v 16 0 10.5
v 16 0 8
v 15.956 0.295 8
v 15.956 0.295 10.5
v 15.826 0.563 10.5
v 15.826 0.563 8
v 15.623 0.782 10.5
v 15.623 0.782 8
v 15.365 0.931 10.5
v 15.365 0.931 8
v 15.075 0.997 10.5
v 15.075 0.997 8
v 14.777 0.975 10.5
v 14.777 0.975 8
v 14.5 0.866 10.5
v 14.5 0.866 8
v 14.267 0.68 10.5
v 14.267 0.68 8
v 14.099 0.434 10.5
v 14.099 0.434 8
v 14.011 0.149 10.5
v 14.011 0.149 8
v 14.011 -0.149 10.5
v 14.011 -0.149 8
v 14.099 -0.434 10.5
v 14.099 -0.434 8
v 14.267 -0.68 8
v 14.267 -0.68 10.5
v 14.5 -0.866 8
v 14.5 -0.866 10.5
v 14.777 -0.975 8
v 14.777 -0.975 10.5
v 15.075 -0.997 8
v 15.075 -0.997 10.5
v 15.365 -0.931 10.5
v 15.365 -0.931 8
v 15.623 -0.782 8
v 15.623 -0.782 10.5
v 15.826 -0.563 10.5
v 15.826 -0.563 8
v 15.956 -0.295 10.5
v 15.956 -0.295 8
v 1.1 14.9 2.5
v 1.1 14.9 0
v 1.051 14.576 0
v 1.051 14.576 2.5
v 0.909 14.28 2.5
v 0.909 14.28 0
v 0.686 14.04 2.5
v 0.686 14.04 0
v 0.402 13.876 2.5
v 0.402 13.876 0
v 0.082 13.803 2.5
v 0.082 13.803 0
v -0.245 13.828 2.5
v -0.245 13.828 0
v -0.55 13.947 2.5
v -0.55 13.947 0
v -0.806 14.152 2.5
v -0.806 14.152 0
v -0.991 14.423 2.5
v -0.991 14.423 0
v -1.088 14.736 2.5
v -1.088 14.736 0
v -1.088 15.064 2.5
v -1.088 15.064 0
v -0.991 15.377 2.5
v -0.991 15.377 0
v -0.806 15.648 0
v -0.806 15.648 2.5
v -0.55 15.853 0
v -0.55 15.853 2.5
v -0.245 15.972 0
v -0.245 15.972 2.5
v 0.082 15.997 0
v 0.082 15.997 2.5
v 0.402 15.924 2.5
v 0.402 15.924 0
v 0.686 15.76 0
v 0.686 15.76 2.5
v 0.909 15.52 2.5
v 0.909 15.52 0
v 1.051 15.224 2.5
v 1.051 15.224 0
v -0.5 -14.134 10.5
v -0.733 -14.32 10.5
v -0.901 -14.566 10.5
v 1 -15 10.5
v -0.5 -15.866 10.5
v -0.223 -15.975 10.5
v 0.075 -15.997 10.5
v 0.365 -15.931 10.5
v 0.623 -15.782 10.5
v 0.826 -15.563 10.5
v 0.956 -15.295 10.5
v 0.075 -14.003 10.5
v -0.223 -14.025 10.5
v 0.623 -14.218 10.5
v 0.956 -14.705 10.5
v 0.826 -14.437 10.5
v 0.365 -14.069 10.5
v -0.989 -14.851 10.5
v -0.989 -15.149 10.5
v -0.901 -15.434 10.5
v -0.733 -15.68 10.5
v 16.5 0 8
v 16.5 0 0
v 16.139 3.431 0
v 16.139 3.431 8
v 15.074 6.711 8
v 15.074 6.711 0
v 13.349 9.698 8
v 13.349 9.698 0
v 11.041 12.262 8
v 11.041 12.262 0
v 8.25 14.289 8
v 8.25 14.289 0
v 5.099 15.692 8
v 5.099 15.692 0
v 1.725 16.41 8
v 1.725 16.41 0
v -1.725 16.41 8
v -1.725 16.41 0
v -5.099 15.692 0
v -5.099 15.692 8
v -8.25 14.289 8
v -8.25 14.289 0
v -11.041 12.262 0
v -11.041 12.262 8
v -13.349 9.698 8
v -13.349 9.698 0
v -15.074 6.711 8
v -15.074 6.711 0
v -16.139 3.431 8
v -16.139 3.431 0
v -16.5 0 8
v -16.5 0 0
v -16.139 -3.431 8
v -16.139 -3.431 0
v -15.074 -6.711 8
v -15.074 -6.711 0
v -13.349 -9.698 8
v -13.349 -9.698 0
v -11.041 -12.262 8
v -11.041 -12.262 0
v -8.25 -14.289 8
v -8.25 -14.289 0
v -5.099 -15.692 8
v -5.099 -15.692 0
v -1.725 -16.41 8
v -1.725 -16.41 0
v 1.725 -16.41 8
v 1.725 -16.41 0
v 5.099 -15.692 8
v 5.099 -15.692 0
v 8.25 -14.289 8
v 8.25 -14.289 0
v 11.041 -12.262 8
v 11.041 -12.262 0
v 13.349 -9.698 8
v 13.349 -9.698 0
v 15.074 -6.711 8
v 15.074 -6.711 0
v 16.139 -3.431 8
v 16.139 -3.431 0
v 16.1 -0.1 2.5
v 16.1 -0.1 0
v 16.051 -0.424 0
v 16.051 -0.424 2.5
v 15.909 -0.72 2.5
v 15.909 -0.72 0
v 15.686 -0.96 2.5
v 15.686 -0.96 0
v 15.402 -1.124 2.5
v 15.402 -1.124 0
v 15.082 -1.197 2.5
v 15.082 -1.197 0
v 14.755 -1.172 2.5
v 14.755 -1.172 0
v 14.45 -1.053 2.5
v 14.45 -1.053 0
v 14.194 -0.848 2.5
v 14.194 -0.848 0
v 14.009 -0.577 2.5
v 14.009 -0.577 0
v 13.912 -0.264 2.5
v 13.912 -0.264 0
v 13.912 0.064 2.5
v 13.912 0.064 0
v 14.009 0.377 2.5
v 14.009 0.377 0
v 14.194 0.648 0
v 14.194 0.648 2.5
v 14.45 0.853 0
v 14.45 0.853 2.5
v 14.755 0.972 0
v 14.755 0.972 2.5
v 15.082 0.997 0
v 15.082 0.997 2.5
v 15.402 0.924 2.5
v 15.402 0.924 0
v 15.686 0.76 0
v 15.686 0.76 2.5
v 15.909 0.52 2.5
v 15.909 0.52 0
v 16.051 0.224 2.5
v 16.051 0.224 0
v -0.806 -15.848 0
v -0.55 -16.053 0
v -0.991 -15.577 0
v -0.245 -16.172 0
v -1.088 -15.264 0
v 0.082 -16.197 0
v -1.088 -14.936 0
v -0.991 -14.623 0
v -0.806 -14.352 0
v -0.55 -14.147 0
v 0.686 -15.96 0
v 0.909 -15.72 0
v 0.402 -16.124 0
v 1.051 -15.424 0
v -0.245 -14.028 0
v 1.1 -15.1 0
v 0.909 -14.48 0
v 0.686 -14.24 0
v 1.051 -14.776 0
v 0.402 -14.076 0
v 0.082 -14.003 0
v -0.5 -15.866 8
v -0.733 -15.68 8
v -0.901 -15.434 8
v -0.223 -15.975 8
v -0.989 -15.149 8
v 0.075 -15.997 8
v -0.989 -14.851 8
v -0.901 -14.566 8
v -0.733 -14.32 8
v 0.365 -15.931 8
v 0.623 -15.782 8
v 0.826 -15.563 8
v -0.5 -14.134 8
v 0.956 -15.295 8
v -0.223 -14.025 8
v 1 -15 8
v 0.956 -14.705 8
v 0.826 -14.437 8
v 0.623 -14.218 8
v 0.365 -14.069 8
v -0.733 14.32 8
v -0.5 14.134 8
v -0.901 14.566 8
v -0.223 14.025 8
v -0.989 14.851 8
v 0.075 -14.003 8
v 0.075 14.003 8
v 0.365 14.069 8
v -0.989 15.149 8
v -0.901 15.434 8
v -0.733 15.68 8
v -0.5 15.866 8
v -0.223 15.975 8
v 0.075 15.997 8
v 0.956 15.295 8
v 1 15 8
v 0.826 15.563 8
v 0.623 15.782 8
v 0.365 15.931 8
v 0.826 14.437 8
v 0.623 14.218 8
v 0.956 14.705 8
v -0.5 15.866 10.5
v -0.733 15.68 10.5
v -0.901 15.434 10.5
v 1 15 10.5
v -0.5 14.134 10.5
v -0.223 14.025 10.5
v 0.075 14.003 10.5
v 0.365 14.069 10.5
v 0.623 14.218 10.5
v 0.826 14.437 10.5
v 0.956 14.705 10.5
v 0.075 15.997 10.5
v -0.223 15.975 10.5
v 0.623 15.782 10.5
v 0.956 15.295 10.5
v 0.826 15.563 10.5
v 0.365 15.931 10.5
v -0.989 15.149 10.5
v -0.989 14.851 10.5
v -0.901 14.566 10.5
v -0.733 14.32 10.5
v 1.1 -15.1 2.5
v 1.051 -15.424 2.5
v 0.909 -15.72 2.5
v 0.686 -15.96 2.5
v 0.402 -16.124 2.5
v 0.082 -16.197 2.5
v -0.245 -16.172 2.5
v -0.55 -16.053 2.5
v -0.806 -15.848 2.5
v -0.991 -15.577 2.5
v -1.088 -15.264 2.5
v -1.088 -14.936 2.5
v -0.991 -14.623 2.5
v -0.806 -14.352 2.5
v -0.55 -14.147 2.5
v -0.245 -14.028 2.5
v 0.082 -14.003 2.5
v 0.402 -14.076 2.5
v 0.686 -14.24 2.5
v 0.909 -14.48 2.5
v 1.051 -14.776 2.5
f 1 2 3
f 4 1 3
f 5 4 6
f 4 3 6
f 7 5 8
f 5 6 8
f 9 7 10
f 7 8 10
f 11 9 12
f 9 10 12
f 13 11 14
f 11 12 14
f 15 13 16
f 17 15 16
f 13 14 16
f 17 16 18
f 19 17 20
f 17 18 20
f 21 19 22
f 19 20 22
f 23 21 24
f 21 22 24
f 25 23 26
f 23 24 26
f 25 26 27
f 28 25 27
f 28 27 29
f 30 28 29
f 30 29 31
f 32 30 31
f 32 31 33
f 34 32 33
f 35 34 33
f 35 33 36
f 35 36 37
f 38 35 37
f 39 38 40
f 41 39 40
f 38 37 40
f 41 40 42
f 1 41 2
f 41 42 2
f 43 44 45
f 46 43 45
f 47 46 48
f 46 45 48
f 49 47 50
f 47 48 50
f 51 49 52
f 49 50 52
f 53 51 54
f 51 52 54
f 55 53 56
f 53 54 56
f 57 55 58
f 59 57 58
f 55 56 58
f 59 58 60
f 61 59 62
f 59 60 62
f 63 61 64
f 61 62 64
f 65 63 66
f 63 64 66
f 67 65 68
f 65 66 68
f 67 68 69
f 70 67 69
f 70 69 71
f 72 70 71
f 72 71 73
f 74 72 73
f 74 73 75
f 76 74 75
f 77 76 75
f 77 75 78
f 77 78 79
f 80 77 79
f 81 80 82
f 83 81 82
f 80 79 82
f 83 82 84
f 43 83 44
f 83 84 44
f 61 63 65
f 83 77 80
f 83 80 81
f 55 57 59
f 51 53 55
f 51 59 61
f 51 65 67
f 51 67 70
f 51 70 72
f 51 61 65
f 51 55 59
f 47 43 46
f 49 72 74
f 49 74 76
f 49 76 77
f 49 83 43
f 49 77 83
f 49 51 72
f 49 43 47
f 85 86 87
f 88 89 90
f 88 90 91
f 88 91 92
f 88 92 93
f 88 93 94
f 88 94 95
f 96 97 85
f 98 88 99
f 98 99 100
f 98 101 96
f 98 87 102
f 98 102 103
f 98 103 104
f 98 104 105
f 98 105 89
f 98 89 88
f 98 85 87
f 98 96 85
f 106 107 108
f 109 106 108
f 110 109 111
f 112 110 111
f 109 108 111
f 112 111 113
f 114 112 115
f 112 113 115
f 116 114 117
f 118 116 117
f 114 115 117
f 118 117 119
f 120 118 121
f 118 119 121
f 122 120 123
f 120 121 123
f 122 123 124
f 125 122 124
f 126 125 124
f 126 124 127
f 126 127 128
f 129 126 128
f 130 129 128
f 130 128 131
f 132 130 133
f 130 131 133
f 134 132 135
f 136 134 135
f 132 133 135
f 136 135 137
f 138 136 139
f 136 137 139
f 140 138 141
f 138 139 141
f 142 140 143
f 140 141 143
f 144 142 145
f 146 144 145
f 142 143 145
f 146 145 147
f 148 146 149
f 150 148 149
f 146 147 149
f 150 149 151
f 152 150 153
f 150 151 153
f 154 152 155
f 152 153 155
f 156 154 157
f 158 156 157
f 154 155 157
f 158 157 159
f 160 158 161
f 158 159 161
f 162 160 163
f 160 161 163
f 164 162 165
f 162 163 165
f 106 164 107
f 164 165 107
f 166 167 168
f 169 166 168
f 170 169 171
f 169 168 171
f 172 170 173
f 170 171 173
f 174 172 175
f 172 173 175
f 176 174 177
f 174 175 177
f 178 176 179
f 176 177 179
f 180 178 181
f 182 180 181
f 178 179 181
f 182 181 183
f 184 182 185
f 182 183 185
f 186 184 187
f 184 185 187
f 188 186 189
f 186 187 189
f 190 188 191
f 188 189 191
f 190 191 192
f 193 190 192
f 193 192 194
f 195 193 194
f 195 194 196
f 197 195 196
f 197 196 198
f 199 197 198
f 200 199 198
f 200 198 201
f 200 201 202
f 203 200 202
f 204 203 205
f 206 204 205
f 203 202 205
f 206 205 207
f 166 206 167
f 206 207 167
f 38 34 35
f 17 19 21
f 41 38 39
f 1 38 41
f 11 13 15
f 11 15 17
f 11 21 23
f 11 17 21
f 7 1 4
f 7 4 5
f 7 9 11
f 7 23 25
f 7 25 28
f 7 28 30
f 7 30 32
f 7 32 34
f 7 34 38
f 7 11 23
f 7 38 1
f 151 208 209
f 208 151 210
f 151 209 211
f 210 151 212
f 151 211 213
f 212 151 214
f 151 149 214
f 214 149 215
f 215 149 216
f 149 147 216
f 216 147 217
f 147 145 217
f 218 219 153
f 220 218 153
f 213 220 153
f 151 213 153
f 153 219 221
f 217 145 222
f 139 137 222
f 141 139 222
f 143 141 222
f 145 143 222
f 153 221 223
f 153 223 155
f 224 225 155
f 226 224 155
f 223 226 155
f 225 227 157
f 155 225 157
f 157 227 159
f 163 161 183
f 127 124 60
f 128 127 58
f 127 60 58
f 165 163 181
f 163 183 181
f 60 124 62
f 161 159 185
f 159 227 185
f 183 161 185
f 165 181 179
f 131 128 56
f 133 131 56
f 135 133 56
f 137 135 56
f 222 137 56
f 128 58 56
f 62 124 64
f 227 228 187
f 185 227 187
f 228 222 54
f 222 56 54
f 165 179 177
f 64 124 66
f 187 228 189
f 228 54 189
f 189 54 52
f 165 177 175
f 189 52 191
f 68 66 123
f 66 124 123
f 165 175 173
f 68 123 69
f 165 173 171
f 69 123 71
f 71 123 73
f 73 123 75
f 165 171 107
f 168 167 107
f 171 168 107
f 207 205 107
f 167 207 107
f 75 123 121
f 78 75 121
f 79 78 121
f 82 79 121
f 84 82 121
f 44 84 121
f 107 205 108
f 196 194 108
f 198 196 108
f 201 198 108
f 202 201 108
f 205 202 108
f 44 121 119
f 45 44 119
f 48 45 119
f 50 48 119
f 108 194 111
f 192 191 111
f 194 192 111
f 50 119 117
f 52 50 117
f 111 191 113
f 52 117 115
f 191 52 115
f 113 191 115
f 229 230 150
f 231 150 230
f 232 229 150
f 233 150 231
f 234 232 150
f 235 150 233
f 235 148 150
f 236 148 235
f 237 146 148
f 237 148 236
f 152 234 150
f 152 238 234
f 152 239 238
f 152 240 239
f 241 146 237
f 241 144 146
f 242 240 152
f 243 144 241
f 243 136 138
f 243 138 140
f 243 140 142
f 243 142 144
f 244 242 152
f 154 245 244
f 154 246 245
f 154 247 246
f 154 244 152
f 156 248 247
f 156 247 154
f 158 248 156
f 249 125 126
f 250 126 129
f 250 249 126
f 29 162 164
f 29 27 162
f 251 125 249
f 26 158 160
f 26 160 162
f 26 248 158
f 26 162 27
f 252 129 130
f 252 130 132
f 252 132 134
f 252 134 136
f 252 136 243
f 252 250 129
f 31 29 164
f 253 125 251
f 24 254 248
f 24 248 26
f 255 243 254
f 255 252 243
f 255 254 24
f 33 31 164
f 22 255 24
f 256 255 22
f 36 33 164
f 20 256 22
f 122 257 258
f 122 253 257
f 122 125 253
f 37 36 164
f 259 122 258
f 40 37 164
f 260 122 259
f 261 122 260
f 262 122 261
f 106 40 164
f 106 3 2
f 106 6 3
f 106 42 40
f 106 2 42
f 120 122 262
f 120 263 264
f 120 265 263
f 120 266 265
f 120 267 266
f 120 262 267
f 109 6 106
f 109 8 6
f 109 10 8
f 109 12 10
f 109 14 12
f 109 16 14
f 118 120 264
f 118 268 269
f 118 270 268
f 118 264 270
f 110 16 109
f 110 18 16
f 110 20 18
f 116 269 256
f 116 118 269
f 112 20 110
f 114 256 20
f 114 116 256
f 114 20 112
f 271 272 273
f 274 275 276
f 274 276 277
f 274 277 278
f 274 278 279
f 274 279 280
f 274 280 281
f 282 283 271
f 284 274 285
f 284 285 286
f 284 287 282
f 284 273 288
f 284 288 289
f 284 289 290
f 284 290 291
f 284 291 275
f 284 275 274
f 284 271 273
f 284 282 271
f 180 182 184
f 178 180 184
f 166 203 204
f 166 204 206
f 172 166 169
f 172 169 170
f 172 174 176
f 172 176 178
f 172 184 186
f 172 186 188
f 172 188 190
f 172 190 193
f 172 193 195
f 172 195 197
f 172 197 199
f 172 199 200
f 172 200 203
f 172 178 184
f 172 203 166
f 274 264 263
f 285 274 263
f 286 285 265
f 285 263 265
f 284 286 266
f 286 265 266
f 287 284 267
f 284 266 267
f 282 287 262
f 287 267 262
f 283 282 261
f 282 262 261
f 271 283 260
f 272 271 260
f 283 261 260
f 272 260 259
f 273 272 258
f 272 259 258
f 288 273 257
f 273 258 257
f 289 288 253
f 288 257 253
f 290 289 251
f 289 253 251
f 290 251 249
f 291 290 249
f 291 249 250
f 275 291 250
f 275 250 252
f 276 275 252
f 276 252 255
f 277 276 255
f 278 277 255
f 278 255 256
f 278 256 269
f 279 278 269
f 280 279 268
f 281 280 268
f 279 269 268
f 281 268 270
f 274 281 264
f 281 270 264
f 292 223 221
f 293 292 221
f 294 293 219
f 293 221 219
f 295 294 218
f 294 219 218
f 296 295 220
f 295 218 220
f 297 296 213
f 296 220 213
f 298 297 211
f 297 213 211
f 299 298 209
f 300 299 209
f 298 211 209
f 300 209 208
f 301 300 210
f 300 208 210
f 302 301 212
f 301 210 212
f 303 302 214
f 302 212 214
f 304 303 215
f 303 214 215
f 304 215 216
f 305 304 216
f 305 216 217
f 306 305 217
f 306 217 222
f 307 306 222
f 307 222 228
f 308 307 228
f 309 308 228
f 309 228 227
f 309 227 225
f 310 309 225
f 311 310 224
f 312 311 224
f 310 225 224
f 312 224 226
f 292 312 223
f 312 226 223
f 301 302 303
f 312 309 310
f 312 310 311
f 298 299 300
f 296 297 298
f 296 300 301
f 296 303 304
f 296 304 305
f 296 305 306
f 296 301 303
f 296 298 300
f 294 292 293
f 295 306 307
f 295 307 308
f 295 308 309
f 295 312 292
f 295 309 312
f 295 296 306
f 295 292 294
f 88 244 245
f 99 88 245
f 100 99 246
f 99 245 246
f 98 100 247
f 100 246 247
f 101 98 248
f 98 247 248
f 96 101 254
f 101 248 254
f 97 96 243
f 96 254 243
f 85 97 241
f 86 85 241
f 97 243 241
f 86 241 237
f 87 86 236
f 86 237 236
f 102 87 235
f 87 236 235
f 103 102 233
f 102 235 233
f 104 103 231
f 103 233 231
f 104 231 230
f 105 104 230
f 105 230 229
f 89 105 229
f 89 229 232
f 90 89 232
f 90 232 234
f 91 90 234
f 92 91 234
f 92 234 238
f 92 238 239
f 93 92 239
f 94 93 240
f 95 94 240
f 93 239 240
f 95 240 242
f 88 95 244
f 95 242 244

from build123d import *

# Parameters (mm, degrees)
F0_R     = 16.5
F1_DEPTH = 8
F2_R     = 1.1
F3_DEPTH = 2.5
F4_R     = 1
F5_DEPTH = 2.5


with BuildPart() as f1:
    # F0 (on Top) → F1 (new body)
    with BuildSketch(Plane.XY):
        Circle(F0_R)
    extrude(amount=F1_DEPTH)

    # F2 (on face) → F3 (cut)
    with BuildSketch(Plane(origin=(0, 0, 0), x_dir=(1, 0, 0), z_dir=(0, 0, -1))):
        with Locations((0, 15.1)):
            Circle(F2_R)
        with Locations((15, 0.1)):
            Circle(F2_R)
        with Locations((0, -14.9)):
            Circle(F2_R)
    extrude(amount=-F3_DEPTH, mode=Mode.SUBTRACT)

    # F4 (on face) → F5 (join)
    with BuildSketch(Plane.XY.offset(8)):
        with Locations((0, 15)):
            Circle(F4_R)
        with Locations((15, 0)):
            Circle(F4_R)
        with Locations((0, -15)):
            Circle(F4_R)
    extrude(amount=F5_DEPTH)


solid = f1.part
